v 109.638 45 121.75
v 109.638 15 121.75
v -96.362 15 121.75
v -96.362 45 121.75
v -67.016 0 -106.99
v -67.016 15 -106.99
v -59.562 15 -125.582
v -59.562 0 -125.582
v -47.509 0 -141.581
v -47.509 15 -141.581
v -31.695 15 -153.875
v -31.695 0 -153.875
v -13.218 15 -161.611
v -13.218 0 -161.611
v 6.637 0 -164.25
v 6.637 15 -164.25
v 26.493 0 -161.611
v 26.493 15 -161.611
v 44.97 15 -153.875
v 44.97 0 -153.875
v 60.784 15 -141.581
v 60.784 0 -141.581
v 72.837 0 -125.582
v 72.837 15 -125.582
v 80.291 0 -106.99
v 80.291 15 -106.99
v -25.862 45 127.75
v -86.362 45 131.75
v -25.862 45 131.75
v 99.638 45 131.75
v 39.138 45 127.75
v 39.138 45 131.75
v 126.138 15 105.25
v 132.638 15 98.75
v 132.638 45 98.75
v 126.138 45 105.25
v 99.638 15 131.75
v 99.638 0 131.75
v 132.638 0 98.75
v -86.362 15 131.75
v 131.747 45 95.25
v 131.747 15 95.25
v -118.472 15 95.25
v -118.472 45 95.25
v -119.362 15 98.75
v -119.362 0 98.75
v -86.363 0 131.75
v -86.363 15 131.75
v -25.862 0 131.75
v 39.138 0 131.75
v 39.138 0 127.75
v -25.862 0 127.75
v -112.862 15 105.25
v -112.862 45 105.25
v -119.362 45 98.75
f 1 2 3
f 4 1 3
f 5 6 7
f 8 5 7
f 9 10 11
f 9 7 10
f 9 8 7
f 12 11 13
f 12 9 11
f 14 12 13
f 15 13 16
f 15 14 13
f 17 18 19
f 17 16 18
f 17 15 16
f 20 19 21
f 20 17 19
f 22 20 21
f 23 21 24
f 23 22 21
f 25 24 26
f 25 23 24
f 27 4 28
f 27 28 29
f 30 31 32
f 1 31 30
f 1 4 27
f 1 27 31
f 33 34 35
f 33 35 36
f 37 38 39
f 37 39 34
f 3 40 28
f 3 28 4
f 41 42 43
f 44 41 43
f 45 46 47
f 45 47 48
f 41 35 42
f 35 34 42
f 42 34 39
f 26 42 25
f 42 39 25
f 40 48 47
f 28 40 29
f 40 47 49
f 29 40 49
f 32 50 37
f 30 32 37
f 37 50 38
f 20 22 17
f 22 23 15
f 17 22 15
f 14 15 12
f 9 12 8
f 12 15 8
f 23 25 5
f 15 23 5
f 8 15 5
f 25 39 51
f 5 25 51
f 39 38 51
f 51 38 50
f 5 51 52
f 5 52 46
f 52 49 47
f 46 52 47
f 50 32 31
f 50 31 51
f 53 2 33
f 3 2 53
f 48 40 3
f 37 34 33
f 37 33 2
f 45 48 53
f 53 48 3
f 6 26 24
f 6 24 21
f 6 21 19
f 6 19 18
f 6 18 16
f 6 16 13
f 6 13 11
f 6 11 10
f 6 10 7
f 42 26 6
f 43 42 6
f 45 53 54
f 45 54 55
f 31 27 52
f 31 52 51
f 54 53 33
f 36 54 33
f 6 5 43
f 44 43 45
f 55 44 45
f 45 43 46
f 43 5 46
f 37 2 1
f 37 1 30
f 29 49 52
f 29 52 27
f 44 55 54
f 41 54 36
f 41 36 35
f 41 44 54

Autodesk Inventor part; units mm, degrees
ref_plane "YZ Plane" through (0, 0, 0) normal (1, 0, 0) x (0, 1, 0)
ref_plane "XZ Plane" through (0, 0, 0) normal (0, 1, 0) x (-1, 0, 0)
ref_plane "XY Plane" through (0, 0, 0) normal (0, 0, 1) x (1, 0, 0)
sketch "Sketch1" plane through (0, 0, 0) normal (0, 1, 0) x (-1, 0, 0)
  circle A0 centre (-6.6375, -88.2502) radius 58
  line L0 (-14.6375, 98.7498) -> (-14.6375, -12.6724)
  arc A1 (-14.6375, -12.6724) -> (-73.5777, -52.264) centre (-6.6375, -88.2502) ccw
  line L1 (-73.5777, -52.264) -> (-112.0003, 98.7498)
  line L2 (-112.0003, 98.7498) -> (-14.6375, 98.7498)
  line L3 (98.7253, 98.7498) -> (60.3027, -52.264)
  arc A2 (60.3027, -52.264) -> (1.3625, -12.6724) centre (-6.6375, -88.2502) ccw
  line L4 (1.3625, -12.6724) -> (1.3625, 98.7498)
  line L5 (1.3625, 98.7498) -> (98.7253, 98.7498)
  line L6 (67.0159, -106.9899) -> (119.3625, 98.7498)
  line L7 (119.3625, 98.7498) -> (119.3625, 131.7498)
  line L8 (119.3625, 131.7498) -> (-132.6375, 131.7498)
  line L9 (-132.6375, 131.7498) -> (-132.6375, 98.7498)
  line L10 (-132.6375, 98.7498) -> (-80.2909, -106.9899)
  arc A3 (-80.2909, -106.9899) -> (67.0159, -106.9899) centre (-6.6375, -88.2502) ccw
extrude "Extrusion1" add sketch "Sketch1" along normal blind 15 contours A0 | L0 A1 L1 L2 | L3 A2 L4 L5 | A3 L10 L9 L8 L7 L6
chamfer "Chamfer1" distance 33 angle 45 2 edges at (-119.3625, 7.5, 131.7498) (132.6375, 7.5, 131.7498)
sketch "Sketch4" plane through (0, 15, 0) normal (0, 1, 0) x (1, 0, 0)
  line L0 (132.6375, -98.7498) -> (99.6375, -131.7498) projected
  line L1 (132.6375, -98.7498) -> (80.2909, 106.9899) projected
  arc A0 (80.2909, 106.9899) -> (-67.0159, 106.9899) centre (6.6375, 88.2502) ccw projected
  line L2 (-67.0159, 106.9899) -> (-119.3625, -98.7498) projected
  line L3 (-86.3625, -131.7498) -> (-119.3625, -98.7498) projected
  line L4 (-86.3625, -131.7498) -> (99.6375, -131.7498) projected
  line L5 (-97.308, -131.7498) -> (123, -131.7498)
  line L6 (123, -131.7498) -> (123, -121.7498)
  line L7 (123, -121.7498) -> (-97.308, -121.7498)
  line L8 (-97.308, -121.7498) -> (-97.308, -131.7498)
  line L9 (-122.7338, -105.2498) -> (137.8877, -105.2498)
  line L10 (137.8877, -105.2498) -> (137.8877, -95.2498)
  line L11 (137.8877, -95.2498) -> (-122.7338, -95.2498)
  line L12 (-122.7338, -95.2498) -> (-122.7338, -105.2498)
  point P0 (0, 0)
  point P1 (109.6375, -121.7498)
  point P2 (-96.3625, -121.7498)
  point P3 (131.747, -95.2498)
  point P4 (-118.472, -95.2498)
  point P5 (-118.8536, -96.7498)
  point P6 (132.1287, -96.7498)
  point P7 (-112.8625, -105.2498)
  point P8 (126.1375, -105.2498)
  dimension "d5" = 10
  dimension "d6" = 10
  dimension "d7" = 16.5
extrude "Extrusion2" add sketch "Sketch4" along normal blind 30 contours L0 L9 L3 L2 L11 L1 | L0 L4 L3 L7
sketch "Sketch5" plane through (-86.3625, 0, 131.7498) normal (0, 0, 1) x (1, 0, 0)
  line L0 (196, 45) -> (-10, 45) projected
  line L1 (0, 0) -> (186, 0) projected
  line L2 (60.5, 45) -> (125.5, 45)
  line L3 (125.5, 45) -> (125.5, 0)
  line L4 (125.5, 0) -> (60.5, 0)
  line L5 (60.5, 0) -> (60.5, 45)
  line L6 (186, 45) -> (186, 0) projected
  line L7 (0, 0) -> (0, 45) projected
  point P0 (86.3625, 0)
  point P1 (186, 22.5)
  point P2 (0, 22.5)
  dimension "d10" = 65
  dimension "d11" = 60.5
  dimension "d12" = 60.5
extrude "Extrusion3" cut sketch "Sketch5" against normal blind 4 contours L3 L1 L5 L0
properties part number "KrovatkaShatunFlanec" material "Aluminum 6061-AHC"
